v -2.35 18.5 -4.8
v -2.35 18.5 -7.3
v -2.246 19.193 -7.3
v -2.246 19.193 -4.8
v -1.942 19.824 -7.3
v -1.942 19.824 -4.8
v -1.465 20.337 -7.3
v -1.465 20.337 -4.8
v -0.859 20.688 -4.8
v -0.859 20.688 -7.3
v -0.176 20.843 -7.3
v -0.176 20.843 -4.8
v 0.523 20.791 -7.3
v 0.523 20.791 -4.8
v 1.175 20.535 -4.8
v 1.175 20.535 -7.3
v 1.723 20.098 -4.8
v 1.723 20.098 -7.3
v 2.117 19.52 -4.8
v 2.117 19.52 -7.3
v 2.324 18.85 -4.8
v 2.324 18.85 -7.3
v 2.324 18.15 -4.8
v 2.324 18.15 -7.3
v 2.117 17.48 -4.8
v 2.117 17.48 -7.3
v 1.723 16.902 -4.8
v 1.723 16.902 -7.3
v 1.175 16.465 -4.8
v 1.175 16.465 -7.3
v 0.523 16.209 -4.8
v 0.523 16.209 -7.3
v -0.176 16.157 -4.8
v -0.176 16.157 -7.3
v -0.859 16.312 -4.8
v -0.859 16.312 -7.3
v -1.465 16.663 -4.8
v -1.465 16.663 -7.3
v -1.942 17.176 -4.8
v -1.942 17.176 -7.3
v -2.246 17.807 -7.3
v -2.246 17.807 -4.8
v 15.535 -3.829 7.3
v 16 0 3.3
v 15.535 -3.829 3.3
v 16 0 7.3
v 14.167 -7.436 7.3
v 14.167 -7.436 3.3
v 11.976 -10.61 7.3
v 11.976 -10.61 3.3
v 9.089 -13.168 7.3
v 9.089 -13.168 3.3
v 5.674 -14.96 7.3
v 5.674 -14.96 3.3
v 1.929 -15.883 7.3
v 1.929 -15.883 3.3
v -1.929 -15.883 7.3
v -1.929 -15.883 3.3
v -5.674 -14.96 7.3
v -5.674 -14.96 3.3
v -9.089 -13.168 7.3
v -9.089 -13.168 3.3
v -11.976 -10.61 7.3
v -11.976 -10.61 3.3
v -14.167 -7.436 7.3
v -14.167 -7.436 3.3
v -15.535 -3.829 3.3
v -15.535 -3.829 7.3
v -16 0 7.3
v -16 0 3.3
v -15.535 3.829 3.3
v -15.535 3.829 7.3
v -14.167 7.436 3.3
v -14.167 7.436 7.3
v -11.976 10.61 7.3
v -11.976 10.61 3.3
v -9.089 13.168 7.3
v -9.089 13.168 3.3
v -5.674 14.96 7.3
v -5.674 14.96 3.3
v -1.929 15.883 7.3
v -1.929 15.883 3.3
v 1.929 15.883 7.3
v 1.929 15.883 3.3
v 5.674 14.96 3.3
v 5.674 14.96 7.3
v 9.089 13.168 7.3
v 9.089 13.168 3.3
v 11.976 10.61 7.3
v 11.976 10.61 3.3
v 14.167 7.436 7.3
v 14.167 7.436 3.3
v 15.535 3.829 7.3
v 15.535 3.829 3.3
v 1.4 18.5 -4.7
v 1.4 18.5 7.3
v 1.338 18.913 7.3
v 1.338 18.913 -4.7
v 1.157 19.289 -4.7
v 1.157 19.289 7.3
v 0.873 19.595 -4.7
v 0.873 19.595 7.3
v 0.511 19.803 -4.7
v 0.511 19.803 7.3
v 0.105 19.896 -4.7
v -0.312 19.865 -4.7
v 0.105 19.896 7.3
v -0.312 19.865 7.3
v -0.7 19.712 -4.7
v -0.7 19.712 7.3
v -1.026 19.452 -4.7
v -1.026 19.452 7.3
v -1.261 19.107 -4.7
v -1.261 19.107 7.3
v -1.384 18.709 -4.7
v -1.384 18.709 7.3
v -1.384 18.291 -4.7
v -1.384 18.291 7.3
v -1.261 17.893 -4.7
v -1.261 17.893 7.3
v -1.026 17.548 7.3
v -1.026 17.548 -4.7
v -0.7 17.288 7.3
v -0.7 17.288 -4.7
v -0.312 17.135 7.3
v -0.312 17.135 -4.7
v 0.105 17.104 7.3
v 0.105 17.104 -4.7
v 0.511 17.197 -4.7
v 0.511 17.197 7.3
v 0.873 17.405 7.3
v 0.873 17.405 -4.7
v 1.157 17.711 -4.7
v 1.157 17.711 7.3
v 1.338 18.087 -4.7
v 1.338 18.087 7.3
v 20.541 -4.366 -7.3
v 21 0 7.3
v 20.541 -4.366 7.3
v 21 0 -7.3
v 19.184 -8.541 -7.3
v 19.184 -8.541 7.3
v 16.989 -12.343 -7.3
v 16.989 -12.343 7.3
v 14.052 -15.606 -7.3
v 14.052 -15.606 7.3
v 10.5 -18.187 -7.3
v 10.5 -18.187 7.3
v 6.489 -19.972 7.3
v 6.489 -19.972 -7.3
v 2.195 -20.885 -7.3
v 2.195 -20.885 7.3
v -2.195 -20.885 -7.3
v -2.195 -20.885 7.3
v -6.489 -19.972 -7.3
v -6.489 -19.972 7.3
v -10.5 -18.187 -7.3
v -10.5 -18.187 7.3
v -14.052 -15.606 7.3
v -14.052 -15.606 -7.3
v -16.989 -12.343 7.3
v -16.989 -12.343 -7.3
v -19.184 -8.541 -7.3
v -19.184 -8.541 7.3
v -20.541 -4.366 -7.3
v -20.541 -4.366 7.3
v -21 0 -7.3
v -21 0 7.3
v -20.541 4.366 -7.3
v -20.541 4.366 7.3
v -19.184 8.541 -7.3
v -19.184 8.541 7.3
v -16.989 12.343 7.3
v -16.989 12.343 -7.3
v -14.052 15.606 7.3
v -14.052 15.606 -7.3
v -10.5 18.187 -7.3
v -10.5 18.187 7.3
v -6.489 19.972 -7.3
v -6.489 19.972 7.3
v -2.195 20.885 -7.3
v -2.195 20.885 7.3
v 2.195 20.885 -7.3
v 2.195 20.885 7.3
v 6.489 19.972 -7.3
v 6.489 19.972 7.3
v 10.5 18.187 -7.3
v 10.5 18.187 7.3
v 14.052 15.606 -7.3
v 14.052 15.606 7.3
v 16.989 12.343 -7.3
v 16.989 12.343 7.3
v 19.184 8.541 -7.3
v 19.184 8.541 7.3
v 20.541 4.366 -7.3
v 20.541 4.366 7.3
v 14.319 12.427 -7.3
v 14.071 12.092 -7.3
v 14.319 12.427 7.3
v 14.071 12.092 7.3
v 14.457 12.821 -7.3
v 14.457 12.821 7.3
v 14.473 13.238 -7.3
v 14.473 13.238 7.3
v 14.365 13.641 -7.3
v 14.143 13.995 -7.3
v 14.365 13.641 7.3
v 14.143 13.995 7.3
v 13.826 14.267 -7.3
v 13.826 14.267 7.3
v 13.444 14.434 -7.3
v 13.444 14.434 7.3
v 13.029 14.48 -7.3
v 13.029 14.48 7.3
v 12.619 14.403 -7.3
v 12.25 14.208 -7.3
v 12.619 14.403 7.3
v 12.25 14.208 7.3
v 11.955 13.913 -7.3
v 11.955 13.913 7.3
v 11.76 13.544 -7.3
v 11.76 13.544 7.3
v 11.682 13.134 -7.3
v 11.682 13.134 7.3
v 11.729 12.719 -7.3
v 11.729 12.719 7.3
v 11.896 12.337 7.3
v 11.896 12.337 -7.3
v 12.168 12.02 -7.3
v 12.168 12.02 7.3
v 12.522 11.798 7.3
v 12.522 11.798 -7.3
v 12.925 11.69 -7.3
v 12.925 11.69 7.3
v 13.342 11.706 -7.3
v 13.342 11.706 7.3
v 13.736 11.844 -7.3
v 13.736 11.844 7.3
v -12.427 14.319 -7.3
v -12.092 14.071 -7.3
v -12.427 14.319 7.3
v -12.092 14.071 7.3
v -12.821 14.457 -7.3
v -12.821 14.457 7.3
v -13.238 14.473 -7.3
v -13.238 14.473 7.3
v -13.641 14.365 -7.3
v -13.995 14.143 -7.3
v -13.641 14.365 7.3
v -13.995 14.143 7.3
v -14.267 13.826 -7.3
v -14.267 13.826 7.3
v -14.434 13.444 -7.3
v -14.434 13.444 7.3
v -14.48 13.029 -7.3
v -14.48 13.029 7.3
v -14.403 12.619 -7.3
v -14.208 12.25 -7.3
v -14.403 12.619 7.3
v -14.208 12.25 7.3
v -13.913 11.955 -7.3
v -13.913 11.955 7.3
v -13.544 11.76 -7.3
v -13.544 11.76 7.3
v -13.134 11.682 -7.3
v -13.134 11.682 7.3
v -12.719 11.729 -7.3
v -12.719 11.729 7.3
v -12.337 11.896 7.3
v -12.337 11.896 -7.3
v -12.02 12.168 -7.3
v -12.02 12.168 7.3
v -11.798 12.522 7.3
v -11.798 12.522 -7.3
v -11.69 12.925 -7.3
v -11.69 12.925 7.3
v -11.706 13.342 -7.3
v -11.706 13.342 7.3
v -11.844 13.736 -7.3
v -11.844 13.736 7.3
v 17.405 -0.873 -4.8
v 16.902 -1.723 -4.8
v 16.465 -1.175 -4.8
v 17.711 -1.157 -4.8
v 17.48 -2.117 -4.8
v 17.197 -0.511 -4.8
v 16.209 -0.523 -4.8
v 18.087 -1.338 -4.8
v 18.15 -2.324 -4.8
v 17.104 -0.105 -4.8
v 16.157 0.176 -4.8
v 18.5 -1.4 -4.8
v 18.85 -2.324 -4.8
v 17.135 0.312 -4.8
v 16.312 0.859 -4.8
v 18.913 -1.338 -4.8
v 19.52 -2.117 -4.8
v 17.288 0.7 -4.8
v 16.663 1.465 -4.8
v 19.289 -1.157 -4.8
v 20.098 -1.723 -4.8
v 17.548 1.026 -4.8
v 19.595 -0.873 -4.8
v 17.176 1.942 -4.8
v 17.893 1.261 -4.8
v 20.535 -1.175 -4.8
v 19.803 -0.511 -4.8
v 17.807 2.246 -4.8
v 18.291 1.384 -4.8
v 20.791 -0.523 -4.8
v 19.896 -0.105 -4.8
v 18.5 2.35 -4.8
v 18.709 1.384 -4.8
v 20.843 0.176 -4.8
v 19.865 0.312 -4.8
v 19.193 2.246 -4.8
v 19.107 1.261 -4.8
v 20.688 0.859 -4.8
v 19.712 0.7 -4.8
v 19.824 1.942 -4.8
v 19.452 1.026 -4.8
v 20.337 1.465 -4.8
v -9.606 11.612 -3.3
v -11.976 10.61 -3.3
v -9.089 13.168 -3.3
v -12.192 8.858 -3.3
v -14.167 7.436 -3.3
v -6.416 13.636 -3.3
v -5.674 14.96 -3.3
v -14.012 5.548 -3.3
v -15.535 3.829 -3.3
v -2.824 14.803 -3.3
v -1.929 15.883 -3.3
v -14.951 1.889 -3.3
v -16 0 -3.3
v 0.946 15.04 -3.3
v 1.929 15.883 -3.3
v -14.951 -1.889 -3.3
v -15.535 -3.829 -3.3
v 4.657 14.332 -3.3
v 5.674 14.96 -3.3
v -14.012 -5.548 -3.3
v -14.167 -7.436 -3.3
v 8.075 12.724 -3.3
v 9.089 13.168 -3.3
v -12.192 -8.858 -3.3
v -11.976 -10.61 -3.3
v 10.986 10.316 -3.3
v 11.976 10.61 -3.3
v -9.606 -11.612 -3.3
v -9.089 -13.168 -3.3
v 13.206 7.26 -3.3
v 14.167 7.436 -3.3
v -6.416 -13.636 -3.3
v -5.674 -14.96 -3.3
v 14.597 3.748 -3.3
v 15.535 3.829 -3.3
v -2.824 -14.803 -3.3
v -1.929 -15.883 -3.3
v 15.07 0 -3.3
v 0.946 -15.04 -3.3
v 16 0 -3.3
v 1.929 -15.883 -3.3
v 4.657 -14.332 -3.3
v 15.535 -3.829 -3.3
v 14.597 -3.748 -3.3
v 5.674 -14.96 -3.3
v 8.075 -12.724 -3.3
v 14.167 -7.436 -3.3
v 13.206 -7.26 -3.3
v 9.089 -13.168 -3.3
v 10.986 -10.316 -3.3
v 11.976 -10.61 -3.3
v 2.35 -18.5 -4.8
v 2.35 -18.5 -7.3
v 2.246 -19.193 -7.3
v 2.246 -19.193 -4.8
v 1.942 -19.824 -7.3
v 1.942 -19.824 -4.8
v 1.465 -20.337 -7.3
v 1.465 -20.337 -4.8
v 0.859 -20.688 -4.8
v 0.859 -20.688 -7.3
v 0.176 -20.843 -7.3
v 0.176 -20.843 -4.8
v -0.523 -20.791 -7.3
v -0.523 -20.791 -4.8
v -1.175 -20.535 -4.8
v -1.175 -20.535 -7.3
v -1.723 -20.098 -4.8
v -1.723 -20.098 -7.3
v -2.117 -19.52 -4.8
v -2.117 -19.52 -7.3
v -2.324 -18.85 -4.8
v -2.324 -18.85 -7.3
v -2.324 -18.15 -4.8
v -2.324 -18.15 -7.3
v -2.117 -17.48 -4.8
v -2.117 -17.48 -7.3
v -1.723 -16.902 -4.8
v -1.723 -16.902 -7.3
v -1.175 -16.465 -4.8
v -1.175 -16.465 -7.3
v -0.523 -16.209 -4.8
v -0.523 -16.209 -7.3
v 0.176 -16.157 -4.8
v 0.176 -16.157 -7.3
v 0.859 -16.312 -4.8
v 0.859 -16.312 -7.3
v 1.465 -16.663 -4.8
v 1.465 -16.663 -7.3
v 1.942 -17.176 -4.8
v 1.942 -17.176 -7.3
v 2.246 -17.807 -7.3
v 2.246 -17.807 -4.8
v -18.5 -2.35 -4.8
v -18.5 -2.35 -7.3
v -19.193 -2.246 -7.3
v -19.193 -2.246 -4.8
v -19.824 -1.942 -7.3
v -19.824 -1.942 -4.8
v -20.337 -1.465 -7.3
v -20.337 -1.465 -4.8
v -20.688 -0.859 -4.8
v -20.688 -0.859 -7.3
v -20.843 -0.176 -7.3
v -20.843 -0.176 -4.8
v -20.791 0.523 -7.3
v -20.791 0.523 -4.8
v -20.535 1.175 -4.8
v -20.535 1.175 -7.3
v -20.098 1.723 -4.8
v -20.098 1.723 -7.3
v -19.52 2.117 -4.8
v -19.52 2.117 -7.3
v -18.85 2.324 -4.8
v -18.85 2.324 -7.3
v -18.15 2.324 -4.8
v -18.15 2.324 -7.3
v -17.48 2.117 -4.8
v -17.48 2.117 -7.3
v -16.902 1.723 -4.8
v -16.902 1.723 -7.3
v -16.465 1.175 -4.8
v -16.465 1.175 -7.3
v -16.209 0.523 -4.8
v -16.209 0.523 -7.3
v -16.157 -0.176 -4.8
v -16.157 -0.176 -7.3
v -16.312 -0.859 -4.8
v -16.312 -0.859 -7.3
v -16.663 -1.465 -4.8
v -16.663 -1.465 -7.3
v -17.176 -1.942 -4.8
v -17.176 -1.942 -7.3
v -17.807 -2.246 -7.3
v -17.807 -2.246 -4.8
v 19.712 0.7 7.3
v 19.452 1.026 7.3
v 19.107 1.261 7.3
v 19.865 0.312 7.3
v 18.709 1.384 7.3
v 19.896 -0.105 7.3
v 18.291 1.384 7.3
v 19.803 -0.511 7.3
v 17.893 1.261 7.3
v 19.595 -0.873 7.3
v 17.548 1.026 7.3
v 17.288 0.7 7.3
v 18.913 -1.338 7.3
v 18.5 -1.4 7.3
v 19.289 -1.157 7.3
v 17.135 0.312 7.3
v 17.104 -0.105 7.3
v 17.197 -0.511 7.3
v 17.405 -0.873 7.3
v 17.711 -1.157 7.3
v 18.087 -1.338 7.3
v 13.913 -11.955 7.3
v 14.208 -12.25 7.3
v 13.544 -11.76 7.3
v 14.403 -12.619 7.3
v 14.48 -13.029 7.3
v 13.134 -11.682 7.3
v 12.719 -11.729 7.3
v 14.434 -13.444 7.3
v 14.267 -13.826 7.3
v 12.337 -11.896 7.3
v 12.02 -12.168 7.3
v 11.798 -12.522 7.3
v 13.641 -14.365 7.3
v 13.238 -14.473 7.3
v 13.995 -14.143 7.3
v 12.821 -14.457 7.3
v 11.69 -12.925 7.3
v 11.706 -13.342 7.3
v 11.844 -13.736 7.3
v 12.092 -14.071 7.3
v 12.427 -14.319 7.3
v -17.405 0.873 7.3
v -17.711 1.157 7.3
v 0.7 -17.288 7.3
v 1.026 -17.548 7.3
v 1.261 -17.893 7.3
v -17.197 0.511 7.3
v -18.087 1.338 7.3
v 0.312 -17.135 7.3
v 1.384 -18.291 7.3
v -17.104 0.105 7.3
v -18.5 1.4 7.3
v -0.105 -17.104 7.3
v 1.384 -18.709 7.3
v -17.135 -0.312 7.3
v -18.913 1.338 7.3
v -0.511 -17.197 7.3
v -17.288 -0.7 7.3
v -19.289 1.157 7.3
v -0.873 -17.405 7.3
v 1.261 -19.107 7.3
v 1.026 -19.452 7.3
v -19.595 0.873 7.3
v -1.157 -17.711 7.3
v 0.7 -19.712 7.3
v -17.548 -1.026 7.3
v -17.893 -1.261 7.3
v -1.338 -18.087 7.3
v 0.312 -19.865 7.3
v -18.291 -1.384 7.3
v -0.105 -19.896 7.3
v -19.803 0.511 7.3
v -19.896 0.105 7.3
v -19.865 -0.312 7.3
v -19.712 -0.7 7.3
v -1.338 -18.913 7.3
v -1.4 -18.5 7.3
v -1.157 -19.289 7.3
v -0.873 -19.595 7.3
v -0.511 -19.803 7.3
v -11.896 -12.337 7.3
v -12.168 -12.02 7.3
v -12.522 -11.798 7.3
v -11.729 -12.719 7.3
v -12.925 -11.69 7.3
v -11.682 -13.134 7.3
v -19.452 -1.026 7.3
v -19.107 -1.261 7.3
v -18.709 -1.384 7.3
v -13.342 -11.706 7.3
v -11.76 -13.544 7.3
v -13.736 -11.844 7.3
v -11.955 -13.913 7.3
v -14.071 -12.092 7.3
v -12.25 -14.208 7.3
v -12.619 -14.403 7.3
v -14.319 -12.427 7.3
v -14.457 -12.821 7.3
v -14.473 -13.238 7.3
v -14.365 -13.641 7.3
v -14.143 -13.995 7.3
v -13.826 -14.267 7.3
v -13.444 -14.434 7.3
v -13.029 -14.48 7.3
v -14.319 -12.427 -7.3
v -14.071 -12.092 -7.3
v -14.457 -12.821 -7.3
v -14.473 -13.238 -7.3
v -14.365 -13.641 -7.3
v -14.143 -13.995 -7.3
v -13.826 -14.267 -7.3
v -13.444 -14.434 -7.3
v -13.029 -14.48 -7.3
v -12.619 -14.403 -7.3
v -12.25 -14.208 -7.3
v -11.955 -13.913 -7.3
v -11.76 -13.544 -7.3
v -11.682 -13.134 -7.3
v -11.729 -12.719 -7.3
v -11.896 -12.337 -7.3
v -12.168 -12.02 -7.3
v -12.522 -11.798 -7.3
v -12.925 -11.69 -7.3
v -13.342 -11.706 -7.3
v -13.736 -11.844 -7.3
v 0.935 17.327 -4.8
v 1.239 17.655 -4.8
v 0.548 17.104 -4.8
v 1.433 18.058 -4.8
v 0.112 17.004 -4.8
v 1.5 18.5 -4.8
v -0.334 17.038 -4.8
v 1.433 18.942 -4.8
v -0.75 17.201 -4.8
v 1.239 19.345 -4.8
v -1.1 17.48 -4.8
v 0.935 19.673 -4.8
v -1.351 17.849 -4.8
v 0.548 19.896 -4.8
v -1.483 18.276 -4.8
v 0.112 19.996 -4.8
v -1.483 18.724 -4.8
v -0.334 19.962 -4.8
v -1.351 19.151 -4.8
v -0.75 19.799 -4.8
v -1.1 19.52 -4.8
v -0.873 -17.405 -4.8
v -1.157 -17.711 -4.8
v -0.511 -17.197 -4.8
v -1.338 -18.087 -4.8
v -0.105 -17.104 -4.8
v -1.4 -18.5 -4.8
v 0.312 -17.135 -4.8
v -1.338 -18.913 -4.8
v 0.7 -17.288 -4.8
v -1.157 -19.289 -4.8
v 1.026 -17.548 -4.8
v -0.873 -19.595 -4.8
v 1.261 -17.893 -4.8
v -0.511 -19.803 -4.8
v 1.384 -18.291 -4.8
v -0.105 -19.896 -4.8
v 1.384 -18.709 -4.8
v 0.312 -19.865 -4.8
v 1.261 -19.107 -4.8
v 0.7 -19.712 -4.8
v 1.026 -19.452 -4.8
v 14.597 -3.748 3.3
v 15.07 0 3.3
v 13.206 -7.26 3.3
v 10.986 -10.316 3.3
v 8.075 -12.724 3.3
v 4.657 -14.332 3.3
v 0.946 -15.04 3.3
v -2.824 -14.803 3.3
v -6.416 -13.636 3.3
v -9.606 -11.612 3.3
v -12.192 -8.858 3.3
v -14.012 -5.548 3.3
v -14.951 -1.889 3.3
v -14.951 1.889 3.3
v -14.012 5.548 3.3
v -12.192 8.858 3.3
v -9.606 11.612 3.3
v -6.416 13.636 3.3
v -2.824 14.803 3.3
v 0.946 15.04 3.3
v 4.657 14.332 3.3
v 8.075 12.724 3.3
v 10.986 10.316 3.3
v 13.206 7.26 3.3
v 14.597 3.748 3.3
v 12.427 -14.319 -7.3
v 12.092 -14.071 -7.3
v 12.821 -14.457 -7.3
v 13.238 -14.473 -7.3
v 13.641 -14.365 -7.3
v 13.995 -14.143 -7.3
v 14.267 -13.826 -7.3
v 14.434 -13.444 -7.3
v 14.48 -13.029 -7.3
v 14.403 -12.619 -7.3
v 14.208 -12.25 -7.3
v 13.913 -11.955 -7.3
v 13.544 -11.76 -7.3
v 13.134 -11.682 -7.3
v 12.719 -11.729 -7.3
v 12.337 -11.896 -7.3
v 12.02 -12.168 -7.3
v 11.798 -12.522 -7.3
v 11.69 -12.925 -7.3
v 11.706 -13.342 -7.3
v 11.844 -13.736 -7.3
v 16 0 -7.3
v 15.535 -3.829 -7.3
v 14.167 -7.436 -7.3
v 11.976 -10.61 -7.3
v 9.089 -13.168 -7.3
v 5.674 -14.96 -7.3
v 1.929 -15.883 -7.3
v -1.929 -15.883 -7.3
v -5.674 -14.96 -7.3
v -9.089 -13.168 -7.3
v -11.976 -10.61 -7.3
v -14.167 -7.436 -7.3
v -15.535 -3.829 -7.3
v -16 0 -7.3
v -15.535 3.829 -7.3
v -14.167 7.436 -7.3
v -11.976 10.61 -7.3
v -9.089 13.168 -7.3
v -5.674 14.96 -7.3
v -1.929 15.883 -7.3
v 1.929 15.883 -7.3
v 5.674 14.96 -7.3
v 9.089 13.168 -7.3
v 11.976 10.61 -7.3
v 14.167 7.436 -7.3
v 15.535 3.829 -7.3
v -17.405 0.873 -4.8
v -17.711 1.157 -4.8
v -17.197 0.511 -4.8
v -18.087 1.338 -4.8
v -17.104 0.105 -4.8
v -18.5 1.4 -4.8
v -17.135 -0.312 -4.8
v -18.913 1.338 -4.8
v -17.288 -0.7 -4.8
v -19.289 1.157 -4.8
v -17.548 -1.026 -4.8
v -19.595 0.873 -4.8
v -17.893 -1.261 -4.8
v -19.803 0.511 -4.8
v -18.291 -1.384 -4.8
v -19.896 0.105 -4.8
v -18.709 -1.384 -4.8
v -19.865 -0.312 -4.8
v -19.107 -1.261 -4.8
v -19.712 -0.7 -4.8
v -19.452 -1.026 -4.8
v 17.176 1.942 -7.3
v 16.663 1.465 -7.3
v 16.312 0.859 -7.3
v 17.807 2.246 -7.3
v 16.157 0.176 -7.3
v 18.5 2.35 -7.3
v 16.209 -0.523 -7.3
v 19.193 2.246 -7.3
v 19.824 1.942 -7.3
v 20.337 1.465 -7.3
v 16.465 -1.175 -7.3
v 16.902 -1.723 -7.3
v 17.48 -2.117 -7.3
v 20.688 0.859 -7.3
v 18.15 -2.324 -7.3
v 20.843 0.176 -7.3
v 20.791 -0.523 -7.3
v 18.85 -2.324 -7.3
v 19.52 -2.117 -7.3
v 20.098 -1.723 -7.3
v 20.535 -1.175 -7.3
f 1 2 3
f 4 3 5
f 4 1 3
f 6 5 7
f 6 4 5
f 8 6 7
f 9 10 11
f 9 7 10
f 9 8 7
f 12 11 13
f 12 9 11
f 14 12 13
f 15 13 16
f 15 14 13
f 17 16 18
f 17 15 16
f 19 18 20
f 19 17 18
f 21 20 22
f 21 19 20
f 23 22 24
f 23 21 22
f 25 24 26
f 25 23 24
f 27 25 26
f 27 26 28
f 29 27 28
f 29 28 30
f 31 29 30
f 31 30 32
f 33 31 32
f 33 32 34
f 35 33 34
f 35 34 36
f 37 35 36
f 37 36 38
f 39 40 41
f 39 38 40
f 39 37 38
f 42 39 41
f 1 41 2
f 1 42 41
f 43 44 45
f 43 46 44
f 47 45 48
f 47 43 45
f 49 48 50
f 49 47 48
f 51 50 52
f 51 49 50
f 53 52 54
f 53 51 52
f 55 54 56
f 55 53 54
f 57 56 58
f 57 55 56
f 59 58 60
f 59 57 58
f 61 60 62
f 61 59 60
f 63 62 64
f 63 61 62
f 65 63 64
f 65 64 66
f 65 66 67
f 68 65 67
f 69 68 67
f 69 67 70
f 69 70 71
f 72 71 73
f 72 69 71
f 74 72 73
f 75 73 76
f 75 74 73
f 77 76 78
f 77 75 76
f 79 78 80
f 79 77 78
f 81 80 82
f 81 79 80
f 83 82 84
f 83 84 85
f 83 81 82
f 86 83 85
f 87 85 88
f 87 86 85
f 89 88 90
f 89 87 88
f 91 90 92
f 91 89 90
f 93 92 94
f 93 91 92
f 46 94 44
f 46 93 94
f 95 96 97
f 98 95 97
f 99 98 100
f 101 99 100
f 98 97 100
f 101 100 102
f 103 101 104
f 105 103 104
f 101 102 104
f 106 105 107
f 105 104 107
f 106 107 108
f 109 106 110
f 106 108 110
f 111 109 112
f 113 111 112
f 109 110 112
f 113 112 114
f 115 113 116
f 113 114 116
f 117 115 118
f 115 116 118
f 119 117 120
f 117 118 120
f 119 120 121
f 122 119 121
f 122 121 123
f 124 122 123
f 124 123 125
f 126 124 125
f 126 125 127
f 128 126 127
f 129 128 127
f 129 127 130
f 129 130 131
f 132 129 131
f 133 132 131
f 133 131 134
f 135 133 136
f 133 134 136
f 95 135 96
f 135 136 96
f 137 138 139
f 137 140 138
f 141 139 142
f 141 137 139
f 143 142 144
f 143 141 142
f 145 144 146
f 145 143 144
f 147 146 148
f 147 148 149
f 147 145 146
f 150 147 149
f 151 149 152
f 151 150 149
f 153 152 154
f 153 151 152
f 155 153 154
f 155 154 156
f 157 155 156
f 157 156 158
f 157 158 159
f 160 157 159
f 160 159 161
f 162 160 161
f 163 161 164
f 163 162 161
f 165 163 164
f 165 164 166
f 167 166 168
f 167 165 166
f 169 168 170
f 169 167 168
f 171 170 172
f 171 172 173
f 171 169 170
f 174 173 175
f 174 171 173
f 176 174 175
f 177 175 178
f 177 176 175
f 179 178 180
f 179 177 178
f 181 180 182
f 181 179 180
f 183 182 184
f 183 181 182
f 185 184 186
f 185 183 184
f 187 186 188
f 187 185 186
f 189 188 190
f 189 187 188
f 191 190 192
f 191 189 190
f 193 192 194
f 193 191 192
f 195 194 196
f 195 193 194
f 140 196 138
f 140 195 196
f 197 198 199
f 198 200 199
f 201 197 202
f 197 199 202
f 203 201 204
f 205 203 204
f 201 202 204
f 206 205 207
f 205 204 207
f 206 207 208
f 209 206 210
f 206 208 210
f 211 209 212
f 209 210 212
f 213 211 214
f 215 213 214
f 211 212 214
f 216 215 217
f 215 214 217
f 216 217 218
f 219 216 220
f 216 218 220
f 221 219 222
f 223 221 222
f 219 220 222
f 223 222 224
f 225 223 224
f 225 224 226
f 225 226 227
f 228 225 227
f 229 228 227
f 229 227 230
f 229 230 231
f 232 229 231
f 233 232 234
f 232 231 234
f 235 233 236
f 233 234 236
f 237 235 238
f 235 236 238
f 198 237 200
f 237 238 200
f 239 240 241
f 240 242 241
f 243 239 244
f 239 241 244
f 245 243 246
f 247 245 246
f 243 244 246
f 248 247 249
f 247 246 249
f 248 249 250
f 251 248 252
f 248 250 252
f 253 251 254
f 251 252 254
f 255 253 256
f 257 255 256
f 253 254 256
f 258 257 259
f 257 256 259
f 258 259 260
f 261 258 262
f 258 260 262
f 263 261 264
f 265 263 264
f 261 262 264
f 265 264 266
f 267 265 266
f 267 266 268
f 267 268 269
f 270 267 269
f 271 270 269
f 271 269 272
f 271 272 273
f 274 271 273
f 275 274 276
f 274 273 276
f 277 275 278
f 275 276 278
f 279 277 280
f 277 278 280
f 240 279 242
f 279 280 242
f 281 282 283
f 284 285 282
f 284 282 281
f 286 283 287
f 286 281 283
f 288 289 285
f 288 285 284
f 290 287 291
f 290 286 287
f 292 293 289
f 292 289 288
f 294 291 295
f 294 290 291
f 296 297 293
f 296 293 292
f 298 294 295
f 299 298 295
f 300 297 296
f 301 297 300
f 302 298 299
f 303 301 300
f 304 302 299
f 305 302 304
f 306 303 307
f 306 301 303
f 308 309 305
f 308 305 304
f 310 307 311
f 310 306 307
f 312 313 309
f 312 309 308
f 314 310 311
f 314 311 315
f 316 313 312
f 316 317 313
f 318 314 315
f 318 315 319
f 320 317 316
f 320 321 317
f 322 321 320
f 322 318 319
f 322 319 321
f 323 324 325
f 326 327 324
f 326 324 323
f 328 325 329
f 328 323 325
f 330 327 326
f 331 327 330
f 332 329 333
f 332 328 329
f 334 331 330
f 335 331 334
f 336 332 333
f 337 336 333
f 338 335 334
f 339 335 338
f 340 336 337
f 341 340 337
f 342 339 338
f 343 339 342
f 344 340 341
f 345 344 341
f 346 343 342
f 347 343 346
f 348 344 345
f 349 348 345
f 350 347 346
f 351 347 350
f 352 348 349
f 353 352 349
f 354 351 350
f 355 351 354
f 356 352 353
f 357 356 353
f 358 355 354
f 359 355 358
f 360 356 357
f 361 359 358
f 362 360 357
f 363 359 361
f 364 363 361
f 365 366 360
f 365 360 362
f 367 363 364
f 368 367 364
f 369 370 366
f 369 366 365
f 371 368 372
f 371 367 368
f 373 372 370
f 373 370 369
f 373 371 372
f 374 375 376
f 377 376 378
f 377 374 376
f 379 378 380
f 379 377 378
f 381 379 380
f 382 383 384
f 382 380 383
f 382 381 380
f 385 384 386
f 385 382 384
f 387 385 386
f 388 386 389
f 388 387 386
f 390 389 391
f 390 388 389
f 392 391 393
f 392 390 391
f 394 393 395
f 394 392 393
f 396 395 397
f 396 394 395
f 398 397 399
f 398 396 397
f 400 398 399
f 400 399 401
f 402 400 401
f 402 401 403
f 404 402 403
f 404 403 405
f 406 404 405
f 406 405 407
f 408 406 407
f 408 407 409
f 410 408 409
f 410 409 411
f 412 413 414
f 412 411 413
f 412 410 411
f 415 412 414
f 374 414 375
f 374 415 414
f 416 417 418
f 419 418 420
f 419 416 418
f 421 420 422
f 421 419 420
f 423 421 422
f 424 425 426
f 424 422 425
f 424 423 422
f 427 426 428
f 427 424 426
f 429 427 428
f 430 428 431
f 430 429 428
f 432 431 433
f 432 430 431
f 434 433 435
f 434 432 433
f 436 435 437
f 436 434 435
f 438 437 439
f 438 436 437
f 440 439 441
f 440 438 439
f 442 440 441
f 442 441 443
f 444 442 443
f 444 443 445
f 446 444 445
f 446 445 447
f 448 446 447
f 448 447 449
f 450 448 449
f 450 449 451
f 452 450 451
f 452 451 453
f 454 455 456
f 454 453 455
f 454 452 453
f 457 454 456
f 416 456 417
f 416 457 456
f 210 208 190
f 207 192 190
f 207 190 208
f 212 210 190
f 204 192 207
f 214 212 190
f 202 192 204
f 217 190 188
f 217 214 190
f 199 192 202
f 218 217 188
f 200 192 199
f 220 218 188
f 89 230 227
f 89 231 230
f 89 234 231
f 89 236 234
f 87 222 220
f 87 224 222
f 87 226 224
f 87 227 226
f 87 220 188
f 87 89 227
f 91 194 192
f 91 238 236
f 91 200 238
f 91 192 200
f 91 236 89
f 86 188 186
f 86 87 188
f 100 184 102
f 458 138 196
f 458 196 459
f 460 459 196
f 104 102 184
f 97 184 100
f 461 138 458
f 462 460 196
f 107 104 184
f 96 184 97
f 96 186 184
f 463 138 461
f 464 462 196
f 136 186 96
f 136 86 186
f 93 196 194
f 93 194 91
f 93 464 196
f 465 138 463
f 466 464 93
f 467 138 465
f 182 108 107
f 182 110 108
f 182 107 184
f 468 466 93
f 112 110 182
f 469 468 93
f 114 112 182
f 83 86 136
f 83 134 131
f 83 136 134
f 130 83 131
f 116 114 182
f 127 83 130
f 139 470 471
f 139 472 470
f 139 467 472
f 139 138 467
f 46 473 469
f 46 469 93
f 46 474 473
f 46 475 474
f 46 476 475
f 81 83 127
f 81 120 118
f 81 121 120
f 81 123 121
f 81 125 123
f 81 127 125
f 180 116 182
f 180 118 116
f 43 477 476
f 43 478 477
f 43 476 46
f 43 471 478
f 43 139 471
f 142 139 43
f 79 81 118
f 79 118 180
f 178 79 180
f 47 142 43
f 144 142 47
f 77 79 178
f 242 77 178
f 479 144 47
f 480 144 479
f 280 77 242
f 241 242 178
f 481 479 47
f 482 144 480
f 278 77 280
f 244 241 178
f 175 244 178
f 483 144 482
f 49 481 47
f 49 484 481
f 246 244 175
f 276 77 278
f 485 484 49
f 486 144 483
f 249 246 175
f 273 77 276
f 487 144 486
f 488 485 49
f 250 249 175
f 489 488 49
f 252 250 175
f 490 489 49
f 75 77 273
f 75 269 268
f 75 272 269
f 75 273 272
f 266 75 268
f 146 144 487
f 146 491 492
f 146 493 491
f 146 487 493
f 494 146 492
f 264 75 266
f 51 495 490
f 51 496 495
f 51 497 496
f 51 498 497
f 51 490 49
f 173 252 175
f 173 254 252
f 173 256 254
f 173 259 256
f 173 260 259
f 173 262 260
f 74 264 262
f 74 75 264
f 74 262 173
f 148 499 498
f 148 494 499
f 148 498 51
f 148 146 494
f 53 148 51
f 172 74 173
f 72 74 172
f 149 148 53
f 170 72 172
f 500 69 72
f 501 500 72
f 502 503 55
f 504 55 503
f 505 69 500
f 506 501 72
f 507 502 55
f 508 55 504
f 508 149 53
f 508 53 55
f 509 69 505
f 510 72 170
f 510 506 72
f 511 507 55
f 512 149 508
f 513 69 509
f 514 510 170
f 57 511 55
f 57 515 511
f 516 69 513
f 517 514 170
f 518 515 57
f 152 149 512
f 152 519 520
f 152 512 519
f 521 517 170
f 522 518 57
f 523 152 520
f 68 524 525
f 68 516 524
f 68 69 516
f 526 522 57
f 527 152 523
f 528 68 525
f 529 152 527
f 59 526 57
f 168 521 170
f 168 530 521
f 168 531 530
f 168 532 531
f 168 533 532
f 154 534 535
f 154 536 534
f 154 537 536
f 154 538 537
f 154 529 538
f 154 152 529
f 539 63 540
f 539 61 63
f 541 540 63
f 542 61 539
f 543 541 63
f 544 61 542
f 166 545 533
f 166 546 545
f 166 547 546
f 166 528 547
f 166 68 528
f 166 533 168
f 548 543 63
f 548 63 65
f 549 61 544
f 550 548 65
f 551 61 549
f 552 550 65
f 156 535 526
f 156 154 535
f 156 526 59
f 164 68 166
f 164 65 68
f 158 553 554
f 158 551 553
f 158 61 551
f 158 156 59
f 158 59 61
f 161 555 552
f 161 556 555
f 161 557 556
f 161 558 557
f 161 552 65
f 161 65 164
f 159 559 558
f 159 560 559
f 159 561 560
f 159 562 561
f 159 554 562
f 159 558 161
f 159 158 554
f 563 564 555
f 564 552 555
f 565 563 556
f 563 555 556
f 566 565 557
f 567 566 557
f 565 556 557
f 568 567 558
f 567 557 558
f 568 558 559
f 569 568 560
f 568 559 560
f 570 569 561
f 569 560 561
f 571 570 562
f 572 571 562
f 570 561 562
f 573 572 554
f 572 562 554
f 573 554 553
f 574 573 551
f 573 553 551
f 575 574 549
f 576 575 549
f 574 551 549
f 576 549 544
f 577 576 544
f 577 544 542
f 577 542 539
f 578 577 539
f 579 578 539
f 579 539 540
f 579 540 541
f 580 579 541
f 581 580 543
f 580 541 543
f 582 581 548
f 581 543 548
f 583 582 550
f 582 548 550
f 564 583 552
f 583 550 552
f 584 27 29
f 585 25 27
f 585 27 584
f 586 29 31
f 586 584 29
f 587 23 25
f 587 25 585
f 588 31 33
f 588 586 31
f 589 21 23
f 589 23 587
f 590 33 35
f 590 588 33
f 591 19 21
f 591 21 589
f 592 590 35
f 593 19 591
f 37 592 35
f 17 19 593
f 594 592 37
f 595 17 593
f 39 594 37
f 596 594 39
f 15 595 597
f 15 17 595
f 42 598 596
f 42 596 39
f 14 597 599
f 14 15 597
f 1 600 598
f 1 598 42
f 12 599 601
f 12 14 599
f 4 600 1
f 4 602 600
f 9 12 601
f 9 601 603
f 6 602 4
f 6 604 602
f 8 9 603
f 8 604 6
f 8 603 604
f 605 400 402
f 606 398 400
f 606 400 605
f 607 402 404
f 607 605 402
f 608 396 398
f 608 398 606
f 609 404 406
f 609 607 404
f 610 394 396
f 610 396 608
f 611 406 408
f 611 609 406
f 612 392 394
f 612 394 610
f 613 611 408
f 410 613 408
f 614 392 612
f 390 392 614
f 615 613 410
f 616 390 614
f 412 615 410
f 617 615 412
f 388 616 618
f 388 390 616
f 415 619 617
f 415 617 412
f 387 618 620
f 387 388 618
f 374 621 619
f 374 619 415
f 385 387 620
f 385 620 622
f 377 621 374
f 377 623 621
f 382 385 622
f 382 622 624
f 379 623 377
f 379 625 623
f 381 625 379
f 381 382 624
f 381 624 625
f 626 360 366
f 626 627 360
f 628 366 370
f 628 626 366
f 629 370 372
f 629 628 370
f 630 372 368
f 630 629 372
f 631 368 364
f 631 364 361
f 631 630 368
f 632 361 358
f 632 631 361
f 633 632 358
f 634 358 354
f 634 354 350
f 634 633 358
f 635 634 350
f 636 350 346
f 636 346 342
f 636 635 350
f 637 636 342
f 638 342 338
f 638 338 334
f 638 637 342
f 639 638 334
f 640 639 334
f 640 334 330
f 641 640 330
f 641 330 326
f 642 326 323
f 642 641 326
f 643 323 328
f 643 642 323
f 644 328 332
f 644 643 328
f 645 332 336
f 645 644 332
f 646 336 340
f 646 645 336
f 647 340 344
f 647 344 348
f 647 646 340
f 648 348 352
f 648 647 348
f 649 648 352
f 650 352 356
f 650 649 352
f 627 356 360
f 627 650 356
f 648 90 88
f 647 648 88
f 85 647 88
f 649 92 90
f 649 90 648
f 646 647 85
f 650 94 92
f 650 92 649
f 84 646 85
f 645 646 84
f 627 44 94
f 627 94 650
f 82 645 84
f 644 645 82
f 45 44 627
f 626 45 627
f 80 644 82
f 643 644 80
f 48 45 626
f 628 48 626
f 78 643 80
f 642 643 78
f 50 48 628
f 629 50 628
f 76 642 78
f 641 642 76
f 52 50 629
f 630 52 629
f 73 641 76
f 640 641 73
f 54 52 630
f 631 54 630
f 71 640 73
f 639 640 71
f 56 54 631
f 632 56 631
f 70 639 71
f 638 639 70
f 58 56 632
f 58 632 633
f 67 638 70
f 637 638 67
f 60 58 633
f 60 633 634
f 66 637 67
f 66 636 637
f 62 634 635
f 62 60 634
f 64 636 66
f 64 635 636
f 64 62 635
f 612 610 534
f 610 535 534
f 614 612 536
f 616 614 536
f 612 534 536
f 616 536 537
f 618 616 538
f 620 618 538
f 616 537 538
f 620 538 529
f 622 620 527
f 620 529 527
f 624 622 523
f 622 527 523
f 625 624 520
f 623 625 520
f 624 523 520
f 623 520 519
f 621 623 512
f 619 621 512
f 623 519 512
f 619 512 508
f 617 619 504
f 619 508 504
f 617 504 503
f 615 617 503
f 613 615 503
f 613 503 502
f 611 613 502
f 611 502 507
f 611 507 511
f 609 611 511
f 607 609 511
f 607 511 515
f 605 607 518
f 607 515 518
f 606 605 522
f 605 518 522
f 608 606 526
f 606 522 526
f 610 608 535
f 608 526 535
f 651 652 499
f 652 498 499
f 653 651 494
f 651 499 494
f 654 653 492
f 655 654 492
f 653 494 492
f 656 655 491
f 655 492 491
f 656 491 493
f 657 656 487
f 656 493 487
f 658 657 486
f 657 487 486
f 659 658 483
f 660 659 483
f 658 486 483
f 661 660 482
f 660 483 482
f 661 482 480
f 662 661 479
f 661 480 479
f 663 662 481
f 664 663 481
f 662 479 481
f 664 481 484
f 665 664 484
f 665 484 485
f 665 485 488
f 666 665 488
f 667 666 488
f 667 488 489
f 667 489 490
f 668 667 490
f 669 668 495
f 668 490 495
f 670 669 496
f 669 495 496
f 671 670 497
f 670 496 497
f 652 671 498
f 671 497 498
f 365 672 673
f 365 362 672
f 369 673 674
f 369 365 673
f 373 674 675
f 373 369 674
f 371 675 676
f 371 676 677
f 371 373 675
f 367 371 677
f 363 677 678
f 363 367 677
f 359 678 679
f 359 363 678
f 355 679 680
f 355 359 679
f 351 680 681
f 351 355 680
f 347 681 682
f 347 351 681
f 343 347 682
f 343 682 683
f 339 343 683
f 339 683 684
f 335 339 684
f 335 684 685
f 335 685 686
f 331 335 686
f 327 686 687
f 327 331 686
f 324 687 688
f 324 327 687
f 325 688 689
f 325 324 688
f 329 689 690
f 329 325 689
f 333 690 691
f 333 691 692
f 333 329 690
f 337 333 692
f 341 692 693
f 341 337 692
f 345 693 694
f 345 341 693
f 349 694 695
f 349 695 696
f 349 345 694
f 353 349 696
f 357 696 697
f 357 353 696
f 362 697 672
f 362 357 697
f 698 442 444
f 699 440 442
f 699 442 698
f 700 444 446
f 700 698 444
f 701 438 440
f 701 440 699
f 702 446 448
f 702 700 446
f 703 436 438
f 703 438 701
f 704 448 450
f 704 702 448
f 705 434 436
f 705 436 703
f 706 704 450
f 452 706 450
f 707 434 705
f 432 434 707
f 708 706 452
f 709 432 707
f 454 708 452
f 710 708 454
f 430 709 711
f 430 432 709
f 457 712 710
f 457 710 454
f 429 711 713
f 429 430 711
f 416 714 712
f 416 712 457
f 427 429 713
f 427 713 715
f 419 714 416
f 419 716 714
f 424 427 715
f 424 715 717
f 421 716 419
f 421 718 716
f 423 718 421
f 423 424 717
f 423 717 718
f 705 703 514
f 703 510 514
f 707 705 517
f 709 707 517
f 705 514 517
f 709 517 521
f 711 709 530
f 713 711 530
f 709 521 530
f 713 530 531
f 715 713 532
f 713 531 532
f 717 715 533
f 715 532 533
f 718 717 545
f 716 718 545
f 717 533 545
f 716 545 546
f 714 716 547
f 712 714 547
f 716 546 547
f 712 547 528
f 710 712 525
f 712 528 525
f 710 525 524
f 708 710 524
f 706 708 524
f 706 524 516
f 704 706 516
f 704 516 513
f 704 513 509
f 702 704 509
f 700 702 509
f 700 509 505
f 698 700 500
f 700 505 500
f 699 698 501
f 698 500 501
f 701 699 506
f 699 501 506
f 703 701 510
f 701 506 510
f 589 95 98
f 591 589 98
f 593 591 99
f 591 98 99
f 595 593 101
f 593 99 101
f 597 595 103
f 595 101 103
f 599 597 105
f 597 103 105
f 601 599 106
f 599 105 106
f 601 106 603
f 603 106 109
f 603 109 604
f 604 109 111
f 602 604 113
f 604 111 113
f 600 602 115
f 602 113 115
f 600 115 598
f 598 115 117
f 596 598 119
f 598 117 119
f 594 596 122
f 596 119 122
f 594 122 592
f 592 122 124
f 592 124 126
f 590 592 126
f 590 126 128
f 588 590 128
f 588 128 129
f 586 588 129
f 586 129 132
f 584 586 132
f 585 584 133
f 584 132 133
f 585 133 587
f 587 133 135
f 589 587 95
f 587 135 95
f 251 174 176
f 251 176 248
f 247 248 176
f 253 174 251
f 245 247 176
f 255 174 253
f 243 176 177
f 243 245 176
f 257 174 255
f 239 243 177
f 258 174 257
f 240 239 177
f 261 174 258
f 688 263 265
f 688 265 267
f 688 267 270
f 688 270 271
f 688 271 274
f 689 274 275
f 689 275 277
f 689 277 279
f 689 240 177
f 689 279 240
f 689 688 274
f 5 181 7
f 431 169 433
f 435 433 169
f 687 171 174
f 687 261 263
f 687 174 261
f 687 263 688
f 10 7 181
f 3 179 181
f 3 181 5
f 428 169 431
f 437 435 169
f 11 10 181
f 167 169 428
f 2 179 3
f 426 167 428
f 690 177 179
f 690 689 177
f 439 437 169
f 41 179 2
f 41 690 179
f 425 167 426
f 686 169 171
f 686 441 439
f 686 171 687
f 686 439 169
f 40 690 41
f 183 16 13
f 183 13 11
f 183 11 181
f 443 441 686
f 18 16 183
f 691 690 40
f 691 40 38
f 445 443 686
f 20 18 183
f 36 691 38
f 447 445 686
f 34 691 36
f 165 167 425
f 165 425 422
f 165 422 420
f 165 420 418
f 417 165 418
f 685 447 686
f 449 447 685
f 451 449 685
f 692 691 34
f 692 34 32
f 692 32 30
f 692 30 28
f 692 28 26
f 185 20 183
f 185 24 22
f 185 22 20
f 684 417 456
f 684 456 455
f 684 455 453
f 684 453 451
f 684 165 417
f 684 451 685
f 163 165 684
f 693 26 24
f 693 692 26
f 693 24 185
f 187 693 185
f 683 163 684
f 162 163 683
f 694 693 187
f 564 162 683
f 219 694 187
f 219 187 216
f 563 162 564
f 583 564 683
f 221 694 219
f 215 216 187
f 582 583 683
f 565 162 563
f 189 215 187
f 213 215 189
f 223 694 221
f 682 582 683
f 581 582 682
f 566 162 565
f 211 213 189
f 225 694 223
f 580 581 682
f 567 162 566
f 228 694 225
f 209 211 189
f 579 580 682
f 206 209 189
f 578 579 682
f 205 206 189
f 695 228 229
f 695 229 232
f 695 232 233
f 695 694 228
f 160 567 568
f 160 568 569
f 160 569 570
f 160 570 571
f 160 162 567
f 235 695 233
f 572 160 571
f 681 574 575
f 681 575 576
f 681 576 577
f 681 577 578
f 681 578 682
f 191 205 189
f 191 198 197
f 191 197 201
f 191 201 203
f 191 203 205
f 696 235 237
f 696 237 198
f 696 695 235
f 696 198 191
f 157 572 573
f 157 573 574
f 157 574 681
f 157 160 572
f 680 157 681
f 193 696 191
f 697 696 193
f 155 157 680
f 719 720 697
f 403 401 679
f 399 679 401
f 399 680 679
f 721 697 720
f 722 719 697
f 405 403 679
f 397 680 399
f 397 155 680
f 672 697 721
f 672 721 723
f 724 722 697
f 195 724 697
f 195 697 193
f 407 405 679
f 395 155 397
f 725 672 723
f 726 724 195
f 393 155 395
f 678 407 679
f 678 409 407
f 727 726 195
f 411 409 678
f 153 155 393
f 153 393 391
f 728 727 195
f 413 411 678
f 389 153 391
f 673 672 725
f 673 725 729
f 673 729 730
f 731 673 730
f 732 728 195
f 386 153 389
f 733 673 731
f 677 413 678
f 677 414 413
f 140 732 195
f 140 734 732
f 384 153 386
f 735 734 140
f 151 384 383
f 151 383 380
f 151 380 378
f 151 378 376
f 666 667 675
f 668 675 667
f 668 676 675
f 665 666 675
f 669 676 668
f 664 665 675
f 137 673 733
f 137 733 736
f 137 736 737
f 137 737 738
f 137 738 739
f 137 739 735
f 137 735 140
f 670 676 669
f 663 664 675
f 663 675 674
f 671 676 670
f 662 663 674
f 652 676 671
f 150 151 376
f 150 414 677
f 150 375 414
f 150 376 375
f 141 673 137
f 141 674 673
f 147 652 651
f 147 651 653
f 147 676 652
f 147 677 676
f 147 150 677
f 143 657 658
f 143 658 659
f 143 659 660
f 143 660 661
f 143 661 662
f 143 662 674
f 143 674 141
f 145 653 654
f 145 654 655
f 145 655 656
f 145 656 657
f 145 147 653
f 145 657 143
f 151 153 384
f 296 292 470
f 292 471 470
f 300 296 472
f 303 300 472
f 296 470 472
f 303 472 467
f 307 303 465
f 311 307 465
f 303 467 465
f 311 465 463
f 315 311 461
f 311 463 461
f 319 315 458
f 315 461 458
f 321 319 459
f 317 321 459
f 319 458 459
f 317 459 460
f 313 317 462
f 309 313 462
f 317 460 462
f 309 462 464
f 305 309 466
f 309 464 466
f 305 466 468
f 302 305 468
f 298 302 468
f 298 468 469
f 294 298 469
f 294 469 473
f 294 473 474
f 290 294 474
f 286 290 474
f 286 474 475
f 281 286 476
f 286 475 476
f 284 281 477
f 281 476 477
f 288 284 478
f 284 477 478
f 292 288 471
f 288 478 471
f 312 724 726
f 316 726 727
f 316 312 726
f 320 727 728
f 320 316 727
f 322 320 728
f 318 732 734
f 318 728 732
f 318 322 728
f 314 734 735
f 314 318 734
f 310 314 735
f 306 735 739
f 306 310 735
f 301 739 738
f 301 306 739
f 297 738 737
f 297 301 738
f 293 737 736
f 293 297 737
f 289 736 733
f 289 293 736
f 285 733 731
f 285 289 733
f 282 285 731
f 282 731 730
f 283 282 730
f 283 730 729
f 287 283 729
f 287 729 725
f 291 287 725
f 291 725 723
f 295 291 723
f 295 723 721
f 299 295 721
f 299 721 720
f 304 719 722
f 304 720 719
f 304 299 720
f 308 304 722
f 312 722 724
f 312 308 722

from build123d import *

# Parameters (mm, degrees)
SKETCH3_R          = 1.4
CUT_EXTRUDE2_DEPTH = 8.3
CUT_EXTRUDE4_START = -2.5
SKETCH4_R          = 2.35
CUT_EXTRUDE4_DEPTH = 3.5
CHAMFER1_SIZE      = 0.1
CIRPATTERN3_COUNT  = 4
CIRPATTERN2_COUNT  = 8


with BuildPart() as part:
    # Sketch7 → Revolve1 (revolve)
    with BuildSketch(Plane(origin=(0, 0, 0), x_dir=(1, 0, 0), z_dir=(0, 1, 0))):
        Polygon((16, 7.3), (16, 3.3), (15.07, 3.3), (15.07, -3.3), (16, -3.3), (16, -7.3), (21, -7.3), (21, 7.3), align=None)
    revolve(axis=Axis((0, 0, 8.03), (0, 0, -1)))

    # Sketch3 → Cut-Extrude2 (cut, symmetric)
    with BuildSketch(Plane.XY):
        with Locations((0, 18.5)):
            Circle(SKETCH3_R)
    cut_extrude2 = extrude(amount=CUT_EXTRUDE2_DEPTH, both=True, mode=Mode.SUBTRACT)

    # Sketch4 → Cut-Extrude4 (cut)
    with BuildSketch(Plane(origin=(0, 0, -7.3), x_dir=(-1, 0, 0), z_dir=(0, 0, -1)).offset(CUT_EXTRUDE4_START)):
        with Locations((0, 18.5)):
            Circle(SKETCH4_R)
    cut_extrude4 = extrude(amount=CUT_EXTRUDE4_DEPTH, mode=Mode.SUBTRACT)

    # Chamfer1
    chamfer1_edges = [part.edges().sort_by_distance(p)[0] for p in [
        (-1.4, 18.5, -4.8),
    ]]
    chamfer(chamfer1_edges, length=CHAMFER1_SIZE)

    # CirPattern3: Cut-Extrude4 ×4 about axis
    cirpattern3_axis = Axis((0, 0, 0), (0, 0, 1))
    for i in range(1, CIRPATTERN3_COUNT):
        add(cut_extrude4.rotate(cirpattern3_axis, i * 360 / CIRPATTERN3_COUNT), mode=Mode.SUBTRACT)

    # CirPattern2: Cut-Extrude2 ×8 about axis
    cirpattern2_axis = Axis((0, 0, 0), (0, 0, 1))
    for i in range(1, CIRPATTERN2_COUNT):
        add(cut_extrude2.rotate(cirpattern2_axis, i * 360 / CIRPATTERN2_COUNT), mode=Mode.SUBTRACT)


solid = part.part
